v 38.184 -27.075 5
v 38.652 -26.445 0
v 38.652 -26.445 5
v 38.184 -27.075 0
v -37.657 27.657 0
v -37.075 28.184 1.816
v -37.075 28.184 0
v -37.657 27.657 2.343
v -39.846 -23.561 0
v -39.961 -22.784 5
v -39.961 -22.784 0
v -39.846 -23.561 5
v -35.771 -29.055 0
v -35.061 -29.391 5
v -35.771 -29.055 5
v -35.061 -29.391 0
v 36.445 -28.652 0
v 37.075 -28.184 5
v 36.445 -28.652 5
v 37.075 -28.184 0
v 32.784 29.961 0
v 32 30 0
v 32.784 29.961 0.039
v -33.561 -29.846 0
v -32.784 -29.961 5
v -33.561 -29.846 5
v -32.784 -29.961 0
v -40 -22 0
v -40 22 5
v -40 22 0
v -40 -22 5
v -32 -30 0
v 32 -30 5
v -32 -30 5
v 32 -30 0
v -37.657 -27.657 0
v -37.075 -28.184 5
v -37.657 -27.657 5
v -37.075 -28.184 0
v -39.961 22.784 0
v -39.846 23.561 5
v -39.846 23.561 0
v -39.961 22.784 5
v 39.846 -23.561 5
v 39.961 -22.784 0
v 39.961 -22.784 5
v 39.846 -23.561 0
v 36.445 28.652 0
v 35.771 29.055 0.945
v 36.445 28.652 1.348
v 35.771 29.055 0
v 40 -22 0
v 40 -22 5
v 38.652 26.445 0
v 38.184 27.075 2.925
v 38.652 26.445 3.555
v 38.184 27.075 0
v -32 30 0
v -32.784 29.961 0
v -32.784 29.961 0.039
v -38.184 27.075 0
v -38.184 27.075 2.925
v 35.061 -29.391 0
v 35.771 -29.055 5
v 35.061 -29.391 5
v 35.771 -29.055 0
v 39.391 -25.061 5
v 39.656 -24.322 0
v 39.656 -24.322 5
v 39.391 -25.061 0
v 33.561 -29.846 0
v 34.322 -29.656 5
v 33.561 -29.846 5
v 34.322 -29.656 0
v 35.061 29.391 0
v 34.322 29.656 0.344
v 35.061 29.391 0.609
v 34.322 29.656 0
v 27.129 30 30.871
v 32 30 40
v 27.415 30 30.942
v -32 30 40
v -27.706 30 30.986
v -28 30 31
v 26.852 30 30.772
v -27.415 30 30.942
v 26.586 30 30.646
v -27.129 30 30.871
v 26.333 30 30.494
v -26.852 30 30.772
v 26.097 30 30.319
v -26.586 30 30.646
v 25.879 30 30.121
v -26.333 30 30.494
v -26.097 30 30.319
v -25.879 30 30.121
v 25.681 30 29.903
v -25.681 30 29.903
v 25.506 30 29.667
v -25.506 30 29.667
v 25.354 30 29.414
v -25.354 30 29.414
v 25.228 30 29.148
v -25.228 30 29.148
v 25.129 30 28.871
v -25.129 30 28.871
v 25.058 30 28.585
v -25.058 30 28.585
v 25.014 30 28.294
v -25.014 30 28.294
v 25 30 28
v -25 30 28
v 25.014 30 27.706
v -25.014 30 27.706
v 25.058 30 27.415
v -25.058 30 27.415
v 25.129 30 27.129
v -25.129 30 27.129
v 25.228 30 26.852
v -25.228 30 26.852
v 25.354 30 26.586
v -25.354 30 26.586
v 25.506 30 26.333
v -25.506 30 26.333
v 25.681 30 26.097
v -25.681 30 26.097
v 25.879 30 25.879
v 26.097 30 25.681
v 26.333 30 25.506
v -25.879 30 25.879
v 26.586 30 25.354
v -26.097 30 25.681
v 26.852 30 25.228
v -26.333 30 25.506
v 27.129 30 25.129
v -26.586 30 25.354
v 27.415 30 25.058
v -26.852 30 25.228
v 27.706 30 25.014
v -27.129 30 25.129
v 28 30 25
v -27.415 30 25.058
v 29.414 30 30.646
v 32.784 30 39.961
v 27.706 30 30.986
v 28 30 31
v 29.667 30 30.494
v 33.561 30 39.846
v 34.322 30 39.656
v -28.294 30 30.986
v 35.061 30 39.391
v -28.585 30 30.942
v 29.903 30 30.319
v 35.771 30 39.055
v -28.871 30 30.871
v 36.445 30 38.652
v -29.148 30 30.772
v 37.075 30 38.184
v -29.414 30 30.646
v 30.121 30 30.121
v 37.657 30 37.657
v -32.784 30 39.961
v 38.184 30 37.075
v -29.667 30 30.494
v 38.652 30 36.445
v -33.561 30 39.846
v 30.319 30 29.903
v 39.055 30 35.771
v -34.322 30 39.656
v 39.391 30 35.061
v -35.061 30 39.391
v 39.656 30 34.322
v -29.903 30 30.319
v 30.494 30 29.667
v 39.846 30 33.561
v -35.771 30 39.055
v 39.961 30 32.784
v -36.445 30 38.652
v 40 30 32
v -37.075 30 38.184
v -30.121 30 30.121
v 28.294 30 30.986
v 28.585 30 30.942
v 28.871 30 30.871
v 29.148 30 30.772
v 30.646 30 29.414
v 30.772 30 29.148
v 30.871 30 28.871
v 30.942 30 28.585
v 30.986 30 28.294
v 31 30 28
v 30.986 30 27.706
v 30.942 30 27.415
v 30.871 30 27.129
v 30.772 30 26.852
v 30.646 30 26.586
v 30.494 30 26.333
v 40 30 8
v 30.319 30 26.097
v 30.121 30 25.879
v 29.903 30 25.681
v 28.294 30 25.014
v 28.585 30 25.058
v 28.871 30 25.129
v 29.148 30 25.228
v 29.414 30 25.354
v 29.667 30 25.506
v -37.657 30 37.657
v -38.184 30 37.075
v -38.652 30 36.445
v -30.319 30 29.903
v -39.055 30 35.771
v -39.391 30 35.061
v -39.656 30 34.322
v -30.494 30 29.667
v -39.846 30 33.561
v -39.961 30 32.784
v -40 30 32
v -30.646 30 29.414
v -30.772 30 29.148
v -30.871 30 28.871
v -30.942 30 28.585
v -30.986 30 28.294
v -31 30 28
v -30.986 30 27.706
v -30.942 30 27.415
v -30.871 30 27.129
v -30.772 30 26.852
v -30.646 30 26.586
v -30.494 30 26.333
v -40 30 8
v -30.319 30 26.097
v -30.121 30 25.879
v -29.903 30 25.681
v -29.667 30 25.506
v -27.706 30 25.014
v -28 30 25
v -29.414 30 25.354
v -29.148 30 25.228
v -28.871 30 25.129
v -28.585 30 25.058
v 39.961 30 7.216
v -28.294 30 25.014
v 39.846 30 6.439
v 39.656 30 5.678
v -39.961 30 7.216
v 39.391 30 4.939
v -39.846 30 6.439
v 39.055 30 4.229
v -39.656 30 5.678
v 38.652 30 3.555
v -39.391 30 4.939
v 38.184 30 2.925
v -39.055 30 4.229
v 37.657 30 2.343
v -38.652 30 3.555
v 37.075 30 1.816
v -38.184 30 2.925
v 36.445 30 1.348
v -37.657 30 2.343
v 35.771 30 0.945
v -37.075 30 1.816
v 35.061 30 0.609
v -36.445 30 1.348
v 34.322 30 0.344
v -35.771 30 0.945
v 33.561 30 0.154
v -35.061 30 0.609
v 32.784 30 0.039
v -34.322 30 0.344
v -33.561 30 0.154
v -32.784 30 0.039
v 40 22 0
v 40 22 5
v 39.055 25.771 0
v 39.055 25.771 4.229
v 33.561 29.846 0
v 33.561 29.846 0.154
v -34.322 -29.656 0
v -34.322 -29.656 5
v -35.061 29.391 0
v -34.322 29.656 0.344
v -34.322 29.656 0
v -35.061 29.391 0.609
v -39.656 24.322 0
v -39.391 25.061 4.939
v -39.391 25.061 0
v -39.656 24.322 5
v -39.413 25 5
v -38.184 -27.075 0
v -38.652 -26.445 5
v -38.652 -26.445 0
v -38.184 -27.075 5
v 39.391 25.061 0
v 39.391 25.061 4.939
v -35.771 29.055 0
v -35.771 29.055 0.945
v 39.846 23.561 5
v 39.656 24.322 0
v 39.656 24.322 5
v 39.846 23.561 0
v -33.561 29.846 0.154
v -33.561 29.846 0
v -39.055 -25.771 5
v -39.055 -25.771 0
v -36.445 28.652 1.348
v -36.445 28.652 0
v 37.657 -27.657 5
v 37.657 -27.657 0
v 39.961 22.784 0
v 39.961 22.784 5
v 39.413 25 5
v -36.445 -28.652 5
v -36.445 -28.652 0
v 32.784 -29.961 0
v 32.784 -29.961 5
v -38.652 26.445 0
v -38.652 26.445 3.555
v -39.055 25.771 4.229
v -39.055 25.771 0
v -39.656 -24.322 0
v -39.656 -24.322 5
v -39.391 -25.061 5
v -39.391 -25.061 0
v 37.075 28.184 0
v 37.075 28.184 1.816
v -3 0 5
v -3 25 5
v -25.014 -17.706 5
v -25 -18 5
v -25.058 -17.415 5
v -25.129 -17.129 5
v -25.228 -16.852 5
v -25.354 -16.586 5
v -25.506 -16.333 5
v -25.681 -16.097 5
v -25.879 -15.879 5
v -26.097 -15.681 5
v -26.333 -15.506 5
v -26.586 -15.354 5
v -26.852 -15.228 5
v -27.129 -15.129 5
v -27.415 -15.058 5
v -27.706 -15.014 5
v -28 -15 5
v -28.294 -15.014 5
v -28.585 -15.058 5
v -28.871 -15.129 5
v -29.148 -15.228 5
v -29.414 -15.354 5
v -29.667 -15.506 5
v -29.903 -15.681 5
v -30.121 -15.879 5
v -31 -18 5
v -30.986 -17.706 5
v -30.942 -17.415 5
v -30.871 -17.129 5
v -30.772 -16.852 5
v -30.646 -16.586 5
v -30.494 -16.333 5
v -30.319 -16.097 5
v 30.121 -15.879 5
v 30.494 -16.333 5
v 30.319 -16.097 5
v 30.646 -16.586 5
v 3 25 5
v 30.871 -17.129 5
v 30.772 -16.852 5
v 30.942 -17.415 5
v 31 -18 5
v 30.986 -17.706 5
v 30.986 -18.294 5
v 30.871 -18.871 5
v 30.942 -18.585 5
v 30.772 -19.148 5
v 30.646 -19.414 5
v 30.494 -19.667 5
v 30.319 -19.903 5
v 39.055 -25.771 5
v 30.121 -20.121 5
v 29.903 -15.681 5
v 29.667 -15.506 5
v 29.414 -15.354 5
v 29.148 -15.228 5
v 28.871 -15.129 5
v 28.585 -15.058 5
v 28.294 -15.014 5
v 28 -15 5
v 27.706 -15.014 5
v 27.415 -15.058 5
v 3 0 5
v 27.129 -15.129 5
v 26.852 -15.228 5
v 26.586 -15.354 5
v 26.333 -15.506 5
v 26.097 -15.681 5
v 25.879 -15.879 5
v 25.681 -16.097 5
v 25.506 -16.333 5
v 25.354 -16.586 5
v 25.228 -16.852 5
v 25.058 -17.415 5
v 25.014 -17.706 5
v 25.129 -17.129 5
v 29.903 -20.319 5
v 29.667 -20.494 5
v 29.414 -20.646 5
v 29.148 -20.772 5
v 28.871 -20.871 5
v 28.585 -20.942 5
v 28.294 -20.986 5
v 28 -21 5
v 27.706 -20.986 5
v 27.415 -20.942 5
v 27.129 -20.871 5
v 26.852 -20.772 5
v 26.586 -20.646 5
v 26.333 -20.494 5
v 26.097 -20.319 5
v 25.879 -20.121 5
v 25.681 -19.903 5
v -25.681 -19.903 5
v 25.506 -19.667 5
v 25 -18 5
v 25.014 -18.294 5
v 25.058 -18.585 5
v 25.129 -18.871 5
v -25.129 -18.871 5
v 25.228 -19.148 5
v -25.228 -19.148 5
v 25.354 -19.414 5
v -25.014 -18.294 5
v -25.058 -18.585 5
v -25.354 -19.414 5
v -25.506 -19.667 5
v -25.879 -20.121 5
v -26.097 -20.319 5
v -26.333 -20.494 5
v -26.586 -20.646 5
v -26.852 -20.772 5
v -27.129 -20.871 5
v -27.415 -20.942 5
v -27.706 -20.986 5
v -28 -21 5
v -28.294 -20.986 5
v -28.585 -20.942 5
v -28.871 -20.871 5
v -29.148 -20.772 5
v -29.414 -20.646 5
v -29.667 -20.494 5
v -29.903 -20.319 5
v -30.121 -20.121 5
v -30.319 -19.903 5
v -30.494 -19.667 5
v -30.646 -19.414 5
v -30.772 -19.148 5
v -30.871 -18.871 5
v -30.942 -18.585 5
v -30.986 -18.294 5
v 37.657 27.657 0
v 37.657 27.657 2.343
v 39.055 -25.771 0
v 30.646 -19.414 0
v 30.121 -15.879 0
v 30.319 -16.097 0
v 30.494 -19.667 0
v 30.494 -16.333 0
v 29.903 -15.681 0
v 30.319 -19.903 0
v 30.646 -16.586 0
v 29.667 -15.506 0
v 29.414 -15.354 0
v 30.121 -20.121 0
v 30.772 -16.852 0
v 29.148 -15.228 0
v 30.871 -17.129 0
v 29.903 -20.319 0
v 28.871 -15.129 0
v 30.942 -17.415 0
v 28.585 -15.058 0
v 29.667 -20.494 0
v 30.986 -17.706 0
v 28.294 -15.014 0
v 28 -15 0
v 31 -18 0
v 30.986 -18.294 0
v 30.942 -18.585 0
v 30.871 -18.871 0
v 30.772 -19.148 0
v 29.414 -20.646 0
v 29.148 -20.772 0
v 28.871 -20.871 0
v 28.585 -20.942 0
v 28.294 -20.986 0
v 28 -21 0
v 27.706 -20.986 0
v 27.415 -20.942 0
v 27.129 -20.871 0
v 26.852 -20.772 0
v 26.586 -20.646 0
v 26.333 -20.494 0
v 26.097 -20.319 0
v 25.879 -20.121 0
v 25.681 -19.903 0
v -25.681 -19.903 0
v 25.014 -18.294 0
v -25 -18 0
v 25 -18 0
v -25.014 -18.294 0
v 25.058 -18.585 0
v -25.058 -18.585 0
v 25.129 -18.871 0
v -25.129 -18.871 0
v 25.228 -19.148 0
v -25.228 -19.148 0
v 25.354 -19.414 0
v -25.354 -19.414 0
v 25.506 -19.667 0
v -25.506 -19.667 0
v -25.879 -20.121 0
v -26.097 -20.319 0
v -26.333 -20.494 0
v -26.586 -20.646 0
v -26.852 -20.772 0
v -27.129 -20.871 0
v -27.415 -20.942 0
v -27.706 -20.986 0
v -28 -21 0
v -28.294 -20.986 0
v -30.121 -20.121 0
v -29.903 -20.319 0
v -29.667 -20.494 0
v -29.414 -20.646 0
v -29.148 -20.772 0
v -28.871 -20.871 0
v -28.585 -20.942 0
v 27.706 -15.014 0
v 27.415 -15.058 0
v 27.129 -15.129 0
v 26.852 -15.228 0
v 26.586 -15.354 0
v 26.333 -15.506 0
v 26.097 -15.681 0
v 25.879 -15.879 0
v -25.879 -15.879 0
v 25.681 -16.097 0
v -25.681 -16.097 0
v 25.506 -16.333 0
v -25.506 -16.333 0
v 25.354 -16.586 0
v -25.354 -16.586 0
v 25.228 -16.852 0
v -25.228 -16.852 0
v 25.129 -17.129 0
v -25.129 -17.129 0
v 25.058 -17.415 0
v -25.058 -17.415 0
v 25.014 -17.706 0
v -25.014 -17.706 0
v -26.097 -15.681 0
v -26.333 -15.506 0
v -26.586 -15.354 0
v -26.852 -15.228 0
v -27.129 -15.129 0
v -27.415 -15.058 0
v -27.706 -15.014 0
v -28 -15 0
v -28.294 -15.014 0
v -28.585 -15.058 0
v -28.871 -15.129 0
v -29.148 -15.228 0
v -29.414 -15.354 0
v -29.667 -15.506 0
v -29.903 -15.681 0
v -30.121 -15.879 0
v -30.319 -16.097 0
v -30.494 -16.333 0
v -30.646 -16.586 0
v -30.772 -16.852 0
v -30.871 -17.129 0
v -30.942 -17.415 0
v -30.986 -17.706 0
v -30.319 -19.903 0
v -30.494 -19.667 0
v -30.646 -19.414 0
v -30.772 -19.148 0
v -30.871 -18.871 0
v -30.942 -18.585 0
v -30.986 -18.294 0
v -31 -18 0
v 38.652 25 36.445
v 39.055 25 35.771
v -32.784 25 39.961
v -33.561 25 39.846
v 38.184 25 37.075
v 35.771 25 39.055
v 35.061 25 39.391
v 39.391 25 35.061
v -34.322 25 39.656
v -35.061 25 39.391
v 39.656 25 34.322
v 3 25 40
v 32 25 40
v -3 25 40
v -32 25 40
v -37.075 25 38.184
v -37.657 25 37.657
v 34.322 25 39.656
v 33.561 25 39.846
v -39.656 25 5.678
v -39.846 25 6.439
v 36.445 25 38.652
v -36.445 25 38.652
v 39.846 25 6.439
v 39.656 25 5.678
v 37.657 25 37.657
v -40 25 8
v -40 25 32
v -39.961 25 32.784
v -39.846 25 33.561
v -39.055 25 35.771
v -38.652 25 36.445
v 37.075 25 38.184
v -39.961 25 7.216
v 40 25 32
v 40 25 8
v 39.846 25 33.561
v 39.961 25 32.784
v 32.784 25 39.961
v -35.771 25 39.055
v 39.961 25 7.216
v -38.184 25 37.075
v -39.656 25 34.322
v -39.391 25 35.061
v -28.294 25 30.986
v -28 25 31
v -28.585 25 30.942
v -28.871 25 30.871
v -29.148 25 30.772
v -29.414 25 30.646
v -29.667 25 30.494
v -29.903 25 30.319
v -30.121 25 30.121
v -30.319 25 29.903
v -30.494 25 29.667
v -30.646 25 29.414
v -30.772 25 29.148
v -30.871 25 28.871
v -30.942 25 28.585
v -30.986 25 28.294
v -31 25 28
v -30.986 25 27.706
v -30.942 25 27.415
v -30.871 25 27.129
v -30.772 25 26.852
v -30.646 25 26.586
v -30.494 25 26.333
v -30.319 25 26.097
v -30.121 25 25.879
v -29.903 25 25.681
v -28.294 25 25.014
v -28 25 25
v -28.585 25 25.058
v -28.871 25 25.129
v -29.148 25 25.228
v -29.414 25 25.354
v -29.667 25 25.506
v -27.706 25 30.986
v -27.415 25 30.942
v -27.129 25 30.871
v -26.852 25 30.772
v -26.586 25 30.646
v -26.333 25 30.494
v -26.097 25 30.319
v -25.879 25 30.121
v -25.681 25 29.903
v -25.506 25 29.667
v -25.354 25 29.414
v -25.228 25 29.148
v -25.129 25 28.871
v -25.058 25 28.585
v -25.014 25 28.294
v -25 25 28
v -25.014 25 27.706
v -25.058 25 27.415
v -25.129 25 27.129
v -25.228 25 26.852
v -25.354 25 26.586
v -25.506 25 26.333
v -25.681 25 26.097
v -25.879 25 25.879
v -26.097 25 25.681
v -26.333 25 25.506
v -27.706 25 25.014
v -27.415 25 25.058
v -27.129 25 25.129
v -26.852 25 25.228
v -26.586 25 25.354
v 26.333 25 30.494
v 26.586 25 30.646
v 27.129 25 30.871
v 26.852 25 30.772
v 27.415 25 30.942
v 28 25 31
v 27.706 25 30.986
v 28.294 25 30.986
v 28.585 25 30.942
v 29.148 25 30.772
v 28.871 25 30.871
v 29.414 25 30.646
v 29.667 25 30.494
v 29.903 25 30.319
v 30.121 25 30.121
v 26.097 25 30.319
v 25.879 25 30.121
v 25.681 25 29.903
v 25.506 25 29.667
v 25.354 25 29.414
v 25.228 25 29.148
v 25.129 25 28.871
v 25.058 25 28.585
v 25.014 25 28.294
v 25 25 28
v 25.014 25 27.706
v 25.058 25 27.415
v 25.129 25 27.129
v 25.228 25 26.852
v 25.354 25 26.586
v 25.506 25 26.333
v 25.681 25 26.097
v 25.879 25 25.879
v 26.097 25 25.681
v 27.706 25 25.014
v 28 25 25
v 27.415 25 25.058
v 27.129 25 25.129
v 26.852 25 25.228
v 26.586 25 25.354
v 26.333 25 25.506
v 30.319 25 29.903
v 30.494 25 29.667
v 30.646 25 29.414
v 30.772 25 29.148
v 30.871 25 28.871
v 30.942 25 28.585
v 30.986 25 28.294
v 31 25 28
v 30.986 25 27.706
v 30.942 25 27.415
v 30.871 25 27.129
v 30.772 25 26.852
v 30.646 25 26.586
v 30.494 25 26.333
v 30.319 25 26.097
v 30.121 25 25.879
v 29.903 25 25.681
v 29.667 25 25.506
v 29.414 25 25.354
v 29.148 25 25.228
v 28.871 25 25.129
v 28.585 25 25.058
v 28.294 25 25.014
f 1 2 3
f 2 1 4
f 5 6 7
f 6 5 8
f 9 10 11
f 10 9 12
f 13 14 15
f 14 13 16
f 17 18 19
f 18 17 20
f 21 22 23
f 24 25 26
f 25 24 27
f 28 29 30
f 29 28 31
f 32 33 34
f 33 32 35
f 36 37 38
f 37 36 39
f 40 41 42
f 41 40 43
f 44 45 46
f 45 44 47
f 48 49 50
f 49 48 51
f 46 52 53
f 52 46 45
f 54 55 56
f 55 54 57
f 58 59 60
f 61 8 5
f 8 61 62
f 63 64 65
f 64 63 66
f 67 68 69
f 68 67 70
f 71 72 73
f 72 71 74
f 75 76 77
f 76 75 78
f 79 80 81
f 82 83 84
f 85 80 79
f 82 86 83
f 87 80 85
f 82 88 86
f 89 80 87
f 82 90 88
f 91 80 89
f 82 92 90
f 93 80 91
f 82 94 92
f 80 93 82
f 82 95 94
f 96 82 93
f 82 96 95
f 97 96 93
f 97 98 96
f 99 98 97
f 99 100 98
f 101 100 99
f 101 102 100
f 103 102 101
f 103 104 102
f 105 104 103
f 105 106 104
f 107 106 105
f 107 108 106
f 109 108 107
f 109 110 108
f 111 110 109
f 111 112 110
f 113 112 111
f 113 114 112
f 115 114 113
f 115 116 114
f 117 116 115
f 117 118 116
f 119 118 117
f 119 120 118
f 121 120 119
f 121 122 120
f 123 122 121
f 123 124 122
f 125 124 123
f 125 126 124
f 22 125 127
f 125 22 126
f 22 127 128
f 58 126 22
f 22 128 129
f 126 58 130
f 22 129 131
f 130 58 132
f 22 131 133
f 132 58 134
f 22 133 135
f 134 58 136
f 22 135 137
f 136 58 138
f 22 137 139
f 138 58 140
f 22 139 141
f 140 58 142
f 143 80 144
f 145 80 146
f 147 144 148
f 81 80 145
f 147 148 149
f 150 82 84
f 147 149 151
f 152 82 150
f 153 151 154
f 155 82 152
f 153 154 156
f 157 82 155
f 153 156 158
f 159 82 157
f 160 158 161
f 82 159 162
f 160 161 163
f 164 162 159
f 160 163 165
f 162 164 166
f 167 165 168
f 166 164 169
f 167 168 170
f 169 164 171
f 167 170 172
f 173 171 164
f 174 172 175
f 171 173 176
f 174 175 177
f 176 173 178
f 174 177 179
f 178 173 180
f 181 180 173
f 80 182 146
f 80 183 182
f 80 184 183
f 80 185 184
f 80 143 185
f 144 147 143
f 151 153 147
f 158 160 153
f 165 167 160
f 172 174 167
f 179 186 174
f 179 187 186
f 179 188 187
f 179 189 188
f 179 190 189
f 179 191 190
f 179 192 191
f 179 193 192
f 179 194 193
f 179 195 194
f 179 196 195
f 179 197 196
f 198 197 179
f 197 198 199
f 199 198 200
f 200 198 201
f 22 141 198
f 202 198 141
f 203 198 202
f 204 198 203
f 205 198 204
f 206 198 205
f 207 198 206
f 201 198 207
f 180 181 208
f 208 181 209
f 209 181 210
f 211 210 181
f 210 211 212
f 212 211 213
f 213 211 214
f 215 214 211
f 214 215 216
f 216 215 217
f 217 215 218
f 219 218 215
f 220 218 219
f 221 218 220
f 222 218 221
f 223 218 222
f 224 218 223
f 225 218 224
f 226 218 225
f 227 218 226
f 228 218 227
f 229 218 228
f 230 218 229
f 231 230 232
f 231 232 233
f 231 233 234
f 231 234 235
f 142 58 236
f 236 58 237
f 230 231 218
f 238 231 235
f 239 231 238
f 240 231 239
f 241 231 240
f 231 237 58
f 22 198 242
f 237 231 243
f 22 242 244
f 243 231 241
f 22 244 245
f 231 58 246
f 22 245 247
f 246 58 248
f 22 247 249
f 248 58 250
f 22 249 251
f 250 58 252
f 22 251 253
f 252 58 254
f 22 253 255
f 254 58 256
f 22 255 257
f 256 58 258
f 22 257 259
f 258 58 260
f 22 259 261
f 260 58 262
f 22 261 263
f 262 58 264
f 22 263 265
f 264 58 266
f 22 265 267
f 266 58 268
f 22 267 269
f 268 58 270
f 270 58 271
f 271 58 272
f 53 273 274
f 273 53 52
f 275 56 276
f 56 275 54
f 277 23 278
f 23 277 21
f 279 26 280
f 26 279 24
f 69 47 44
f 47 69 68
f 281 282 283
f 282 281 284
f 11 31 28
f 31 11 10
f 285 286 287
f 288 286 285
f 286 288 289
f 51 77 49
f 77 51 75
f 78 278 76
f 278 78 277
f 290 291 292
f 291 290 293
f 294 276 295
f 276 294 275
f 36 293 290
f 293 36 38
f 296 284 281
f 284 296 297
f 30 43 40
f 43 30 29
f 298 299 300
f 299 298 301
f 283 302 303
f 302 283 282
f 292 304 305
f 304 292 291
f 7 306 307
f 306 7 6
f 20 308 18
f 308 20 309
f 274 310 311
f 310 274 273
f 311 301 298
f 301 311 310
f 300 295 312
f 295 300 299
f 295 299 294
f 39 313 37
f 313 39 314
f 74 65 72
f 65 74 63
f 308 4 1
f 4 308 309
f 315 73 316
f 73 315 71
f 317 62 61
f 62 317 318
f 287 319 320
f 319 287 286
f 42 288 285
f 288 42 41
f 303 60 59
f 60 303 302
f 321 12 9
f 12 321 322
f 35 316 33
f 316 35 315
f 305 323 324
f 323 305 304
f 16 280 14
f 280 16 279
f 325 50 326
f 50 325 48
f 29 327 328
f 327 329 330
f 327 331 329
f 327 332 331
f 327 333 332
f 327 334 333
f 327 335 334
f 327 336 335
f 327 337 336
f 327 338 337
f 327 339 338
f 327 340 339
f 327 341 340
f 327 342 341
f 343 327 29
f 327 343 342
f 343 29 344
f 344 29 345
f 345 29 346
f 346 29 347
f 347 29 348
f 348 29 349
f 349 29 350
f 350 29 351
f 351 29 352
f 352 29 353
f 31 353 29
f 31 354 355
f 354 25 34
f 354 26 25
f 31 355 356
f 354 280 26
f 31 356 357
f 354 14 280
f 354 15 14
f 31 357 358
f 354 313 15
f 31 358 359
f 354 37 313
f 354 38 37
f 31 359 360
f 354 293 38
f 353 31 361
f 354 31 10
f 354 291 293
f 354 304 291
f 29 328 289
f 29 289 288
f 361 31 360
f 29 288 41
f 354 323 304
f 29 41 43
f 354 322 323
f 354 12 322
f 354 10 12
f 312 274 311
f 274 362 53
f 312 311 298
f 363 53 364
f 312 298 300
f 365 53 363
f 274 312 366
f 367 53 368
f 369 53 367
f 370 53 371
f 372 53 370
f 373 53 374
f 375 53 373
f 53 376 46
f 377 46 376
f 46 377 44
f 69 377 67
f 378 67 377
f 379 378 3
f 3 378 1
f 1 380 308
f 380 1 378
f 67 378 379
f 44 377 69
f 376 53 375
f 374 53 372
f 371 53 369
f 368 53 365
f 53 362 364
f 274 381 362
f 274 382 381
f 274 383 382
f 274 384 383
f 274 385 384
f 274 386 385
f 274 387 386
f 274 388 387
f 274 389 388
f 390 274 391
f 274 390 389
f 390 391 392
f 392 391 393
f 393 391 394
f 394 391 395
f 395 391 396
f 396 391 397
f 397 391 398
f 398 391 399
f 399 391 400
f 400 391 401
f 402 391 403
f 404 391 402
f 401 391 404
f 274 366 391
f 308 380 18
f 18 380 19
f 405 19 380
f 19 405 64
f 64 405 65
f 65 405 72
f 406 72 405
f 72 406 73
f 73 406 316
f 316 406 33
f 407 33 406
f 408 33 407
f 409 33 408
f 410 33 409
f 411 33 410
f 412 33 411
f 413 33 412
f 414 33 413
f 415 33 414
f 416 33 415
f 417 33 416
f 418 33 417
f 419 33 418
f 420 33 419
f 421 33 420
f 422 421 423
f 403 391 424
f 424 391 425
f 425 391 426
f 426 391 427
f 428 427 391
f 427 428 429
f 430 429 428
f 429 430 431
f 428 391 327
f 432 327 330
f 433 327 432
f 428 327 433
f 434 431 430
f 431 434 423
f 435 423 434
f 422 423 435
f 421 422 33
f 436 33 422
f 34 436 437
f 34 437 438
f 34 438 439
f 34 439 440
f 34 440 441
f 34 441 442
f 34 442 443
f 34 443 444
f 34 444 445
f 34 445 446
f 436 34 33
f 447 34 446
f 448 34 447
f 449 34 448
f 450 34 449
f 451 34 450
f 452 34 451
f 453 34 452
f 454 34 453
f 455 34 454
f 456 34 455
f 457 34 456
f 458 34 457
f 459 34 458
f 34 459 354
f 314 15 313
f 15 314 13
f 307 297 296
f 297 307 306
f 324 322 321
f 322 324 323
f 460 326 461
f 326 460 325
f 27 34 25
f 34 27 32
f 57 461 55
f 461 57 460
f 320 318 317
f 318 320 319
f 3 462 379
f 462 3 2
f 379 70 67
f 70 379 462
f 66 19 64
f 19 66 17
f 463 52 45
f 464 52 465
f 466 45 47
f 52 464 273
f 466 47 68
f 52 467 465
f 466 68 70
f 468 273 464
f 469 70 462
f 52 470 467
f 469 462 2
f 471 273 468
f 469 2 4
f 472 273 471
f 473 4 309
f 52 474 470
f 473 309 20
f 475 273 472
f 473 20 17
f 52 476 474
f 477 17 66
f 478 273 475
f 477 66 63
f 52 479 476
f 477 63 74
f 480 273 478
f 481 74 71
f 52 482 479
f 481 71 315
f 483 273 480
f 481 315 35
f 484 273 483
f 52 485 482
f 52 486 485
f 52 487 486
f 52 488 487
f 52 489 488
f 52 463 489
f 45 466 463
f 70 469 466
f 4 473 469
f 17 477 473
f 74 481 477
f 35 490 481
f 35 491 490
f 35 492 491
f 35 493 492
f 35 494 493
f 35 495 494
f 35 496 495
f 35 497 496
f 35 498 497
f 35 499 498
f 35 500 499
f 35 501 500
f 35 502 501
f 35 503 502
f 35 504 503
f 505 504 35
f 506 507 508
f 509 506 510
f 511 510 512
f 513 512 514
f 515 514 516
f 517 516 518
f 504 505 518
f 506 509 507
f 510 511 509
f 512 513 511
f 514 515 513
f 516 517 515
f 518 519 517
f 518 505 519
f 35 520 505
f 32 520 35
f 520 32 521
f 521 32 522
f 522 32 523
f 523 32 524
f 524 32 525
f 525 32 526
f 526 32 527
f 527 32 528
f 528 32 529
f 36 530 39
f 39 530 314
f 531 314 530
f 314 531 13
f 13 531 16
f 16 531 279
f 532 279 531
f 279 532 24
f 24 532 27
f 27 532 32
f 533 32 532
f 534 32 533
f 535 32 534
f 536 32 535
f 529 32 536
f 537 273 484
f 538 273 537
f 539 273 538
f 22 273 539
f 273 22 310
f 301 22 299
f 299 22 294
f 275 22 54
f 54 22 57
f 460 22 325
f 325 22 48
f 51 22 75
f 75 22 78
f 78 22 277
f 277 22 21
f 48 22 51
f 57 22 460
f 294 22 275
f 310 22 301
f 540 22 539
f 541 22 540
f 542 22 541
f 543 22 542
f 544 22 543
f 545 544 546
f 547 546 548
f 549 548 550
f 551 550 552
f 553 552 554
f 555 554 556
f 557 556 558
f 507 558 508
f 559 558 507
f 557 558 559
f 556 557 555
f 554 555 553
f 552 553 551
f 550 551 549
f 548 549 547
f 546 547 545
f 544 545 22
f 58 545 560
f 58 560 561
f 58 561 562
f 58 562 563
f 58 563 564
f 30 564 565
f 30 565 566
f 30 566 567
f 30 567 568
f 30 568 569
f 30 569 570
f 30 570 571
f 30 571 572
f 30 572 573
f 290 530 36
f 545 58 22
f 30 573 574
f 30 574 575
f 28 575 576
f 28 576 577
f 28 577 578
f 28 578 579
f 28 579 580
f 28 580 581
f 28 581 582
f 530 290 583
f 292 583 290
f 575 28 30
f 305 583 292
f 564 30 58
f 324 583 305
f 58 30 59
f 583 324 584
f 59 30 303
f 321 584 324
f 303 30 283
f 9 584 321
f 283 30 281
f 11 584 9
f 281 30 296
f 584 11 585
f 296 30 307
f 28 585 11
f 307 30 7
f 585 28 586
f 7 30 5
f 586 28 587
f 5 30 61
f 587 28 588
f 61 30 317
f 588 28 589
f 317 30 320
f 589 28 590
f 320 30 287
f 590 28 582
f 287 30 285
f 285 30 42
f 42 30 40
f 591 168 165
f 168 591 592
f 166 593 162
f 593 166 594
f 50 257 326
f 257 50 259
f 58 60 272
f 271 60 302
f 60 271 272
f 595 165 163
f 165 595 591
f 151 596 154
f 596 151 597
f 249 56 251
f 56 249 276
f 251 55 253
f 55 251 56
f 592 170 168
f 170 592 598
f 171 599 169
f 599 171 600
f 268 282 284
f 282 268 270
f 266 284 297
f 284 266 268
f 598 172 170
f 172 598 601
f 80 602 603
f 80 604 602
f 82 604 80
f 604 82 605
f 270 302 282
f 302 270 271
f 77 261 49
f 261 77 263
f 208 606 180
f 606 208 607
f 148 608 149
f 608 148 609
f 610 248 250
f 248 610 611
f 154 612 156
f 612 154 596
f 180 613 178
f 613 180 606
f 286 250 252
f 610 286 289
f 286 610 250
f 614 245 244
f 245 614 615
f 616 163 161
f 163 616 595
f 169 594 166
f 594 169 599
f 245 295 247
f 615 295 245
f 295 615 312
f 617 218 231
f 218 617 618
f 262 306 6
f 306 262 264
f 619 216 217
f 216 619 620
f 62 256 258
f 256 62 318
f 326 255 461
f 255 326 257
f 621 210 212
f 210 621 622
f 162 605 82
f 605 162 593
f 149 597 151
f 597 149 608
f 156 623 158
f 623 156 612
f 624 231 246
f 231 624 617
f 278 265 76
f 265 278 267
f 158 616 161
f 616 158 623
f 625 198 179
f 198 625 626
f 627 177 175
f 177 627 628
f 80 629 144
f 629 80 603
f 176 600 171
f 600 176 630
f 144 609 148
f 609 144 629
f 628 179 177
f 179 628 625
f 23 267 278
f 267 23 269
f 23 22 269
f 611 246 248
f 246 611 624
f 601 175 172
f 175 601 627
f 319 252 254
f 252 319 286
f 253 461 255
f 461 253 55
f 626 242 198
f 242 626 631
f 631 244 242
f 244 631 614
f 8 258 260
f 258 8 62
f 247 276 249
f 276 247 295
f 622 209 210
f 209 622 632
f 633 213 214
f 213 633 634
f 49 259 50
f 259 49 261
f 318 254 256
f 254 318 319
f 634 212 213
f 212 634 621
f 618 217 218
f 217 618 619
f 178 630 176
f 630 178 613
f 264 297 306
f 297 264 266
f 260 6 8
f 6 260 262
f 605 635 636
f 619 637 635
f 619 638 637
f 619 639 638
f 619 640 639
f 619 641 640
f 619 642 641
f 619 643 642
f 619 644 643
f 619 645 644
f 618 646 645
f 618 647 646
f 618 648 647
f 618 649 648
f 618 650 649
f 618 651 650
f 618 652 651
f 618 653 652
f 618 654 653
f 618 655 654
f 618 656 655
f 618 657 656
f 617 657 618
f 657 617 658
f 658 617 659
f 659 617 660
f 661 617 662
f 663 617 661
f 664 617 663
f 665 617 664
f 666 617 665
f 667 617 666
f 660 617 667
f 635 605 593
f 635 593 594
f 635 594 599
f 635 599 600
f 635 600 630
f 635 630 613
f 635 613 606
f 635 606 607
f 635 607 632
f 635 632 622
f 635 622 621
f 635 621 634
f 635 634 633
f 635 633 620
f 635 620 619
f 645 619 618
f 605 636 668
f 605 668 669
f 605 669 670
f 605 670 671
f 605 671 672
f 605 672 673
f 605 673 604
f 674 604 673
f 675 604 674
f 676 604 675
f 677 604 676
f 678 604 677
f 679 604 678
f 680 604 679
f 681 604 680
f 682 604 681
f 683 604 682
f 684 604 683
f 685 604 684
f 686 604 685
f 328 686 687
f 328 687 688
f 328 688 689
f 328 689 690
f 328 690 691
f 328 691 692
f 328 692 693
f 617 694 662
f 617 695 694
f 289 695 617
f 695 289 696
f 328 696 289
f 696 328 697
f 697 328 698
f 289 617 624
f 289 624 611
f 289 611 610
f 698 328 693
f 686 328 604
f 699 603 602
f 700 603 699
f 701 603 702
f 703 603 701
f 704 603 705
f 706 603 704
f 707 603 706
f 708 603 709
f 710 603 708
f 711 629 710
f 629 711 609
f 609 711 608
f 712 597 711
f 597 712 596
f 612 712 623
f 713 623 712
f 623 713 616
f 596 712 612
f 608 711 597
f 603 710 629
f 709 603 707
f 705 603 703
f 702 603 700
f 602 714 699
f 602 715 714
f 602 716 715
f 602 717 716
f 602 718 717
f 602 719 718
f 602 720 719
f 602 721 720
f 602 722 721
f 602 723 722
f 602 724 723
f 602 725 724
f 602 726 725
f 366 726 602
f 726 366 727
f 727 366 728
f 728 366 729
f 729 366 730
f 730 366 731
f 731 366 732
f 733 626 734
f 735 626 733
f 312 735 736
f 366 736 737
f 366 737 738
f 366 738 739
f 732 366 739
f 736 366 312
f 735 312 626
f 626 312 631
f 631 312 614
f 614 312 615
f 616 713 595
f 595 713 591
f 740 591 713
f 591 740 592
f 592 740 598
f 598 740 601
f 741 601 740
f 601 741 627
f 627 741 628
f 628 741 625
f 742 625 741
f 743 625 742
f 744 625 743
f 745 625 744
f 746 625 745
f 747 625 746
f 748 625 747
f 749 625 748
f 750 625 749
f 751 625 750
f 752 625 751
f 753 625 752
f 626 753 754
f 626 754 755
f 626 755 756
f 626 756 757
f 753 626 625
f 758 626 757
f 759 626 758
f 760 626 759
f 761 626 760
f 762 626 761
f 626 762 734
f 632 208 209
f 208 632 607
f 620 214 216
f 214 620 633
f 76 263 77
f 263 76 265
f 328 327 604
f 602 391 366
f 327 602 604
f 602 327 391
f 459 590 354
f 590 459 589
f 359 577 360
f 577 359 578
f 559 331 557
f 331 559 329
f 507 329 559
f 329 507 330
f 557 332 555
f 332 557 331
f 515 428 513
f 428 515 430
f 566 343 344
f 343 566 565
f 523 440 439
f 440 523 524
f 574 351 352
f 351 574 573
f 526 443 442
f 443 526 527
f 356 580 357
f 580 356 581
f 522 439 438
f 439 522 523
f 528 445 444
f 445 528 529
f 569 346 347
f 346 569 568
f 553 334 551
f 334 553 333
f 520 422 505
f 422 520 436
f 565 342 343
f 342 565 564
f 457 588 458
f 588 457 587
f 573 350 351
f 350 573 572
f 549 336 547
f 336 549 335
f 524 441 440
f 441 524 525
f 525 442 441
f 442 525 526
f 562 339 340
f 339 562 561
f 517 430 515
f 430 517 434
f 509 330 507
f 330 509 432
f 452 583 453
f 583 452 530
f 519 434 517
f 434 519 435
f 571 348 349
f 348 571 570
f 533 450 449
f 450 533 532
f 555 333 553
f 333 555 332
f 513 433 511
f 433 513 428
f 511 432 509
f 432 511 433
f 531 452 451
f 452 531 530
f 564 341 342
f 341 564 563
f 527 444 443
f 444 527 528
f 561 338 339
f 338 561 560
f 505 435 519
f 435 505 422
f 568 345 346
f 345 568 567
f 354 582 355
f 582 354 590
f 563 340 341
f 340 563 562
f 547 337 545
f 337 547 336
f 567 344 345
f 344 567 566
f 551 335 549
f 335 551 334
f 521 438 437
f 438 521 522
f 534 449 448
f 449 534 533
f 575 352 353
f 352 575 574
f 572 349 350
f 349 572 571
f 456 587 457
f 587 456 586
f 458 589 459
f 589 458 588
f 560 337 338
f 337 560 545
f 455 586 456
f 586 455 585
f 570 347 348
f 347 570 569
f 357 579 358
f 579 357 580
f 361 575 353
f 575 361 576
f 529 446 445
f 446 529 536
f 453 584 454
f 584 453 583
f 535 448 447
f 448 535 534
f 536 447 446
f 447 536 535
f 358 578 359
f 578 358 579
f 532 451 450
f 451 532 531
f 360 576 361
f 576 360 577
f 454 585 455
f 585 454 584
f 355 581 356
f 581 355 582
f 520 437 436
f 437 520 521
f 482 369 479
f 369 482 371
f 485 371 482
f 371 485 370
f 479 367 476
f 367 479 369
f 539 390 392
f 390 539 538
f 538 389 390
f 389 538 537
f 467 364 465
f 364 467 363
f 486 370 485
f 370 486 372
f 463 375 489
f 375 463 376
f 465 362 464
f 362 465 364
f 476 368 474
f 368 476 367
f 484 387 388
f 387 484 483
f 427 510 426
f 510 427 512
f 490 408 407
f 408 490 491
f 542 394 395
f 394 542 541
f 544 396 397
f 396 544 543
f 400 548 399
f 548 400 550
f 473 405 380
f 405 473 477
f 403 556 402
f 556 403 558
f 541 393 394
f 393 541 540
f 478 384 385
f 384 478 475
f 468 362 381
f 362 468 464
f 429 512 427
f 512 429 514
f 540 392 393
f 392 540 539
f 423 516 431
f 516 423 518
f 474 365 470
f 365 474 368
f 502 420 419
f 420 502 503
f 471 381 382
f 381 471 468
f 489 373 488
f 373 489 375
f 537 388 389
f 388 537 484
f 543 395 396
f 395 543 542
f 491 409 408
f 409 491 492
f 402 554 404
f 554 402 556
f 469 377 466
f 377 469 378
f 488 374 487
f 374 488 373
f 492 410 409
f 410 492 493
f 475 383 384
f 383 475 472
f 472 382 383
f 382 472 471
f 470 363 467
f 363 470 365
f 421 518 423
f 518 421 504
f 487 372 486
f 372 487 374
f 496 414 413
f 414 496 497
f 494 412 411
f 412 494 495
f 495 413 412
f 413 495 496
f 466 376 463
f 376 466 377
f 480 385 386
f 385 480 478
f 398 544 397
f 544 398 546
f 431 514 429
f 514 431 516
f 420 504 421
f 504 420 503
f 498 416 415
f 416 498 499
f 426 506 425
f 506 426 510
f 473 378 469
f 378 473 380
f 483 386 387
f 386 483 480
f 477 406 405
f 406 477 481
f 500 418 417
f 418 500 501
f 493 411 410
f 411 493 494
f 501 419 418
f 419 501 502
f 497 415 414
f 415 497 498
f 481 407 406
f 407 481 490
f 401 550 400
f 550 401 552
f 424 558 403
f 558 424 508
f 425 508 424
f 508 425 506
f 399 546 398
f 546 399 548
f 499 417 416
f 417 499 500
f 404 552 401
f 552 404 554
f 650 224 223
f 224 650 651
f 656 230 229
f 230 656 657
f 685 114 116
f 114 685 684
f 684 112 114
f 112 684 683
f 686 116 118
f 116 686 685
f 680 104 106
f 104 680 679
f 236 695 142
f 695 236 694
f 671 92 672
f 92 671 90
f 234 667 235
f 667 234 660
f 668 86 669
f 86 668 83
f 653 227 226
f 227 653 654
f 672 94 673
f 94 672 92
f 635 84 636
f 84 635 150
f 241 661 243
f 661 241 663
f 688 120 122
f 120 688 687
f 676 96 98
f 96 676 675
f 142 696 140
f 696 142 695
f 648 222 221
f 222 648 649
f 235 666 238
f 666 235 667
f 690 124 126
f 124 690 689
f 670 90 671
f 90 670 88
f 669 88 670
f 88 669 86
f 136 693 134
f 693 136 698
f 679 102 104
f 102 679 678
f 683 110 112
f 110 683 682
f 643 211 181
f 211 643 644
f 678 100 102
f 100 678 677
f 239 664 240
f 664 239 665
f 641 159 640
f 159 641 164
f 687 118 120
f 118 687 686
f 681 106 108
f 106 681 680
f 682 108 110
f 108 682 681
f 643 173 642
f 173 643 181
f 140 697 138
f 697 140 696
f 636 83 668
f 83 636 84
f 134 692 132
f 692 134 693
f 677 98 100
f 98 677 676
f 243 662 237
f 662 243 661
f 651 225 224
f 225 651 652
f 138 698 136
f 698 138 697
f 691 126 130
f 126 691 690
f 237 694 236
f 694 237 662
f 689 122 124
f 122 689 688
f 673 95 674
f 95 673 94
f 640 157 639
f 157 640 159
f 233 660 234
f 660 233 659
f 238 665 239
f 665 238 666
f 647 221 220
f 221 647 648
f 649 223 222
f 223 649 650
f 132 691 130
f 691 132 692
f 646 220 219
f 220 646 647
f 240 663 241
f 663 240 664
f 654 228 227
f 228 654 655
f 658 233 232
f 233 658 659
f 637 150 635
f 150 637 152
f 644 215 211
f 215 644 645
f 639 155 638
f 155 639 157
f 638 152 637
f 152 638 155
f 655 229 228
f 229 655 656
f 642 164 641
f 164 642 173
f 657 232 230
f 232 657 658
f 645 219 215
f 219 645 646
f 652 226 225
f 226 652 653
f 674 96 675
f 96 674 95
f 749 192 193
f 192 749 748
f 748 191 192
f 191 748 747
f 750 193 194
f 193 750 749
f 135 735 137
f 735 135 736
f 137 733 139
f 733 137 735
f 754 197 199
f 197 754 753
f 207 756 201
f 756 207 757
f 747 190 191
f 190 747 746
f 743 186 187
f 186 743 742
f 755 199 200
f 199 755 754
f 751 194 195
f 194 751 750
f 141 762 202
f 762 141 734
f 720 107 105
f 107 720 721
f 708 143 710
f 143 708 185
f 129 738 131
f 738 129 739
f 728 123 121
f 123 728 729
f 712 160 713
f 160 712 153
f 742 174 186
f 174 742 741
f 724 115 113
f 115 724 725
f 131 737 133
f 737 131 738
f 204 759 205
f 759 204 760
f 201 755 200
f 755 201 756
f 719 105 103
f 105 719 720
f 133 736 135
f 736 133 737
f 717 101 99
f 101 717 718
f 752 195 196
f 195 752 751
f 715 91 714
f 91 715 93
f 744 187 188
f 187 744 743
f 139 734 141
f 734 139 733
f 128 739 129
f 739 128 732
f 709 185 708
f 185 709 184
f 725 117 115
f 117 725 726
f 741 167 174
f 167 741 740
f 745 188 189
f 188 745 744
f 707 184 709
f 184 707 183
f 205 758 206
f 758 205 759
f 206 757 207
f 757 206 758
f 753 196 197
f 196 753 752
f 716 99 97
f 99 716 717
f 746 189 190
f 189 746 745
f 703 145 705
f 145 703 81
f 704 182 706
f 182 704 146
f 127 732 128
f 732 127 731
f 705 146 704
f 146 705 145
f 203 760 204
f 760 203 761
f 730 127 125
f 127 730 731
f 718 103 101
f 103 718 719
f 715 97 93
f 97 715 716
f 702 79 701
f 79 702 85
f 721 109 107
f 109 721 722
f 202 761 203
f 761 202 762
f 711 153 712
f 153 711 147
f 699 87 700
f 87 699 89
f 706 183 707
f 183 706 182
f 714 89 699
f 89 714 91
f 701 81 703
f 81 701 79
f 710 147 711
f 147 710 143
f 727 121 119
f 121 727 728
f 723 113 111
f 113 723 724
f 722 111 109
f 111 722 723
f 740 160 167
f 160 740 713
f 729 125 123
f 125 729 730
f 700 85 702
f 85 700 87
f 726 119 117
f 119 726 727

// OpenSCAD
// L 型安装支架 —— 带圆角和四个安装孔的示例零件
//
// 参数合法区间用注释声明，model.py check 会读它并强制校验：
//   model.py check examples/bracket.scad --set width=200   # 越界会报错退出
//   model.py check examples/bracket.scad --set width=100   # 正常
//
// @param width 40 140
// @param depth 30 120
// @param height 20 100
// @param thick 3 25
// @param fillet 2 20
// @param hole_d 3 25
// @param hole_inset 8 40

width     = 80;   // X 向总宽
depth     = 60;   // Y 向总深（底板）
height    = 40;   // 立板高度
thick     = 5;    // 板材厚
fillet    = 8;    // 外圆角半径
hole_d    = 6;    // 安装孔直径
hole_inset= 12;   // 孔心到边的距离

$fn = 64;
eps = 0.01;

// ---------- 几何模块 ----------

// XY 平面的圆角板：厚度沿 Z，底面在 z=0
module plate_xy(w, d, t, r) {
    hull()
        for (sx = [-1, 1], sy = [-1, 1])
            translate([sx * (w / 2 - r), sy * (d / 2 - r), 0])
                cylinder(h = t, r = r);
}

// XZ 平面的圆角板：厚度沿 Y、中心落在 y=0，**高度以 z=0 为中心**
// 注意这个模块不自带 z 基准，调用方必须自己把它抬到想要的高度。
module plate_xz(w, h, t, r) {
    translate([0, -t / 2, 0])
        hull()
            for (sx = [-1, 1], sz = [-1, 1])
                translate([sx * (w / 2 - r), 0, sz * (h / 2 - r)])
                    rotate([-90, 0, 0])
                        cylinder(h = t, r = r);
}

// 角撑加强筋：YZ 平面的直角三角形，沿 X 拉伸 tx，x 居中。
// 三角形从 y=0 往 **-Y** 方向长到 -ty（不是 +Y），
// 调用方把它 translate 到立板内表面，让它朝前长；朝 +Y 长会从后缘捅出去。
module gusset(ty, tz, tx) {
    translate([-tx / 2, 0, 0])
        rotate([90, 0, 90])
            linear_extrude(height = tx)
                polygon([[0, 0], [-ty, 0], [0, tz]]);
}

module bracket() {
    difference() {
        union() {
            // 底板
            plate_xy(width, depth, thick, fillet);
            // 立板，贴着底板后缘。plate_xz 以 z=0 为中心，必须抬 height/2
            // 让它坐在底板上，否则一半沉到 z=0 以下、立板顶的孔会打空。
            translate([0, depth / 2 - thick / 2, height / 2])
                plate_xz(width, height, thick, fillet);
            // 中间加强筋：根部贴在立板内表面 y=depth/2-thick，朝前长
            translate([0, depth / 2 - thick, thick])
                gusset(depth / 2 - thick, height - thick, thick * 1.2);
        }

        // 底板两个安装孔（靠近自由边），从底面向下切，通孔
        for (sx = [-1, 1])
            translate([sx * (width / 2 - hole_inset), -depth / 2 + hole_inset, -eps])
                cylinder(h = thick + 2 * eps, d = hole_d);

        // 立板两个安装孔（靠近顶边）。
        // 起点必须是立板**内表面** y=depth/2-thick，不能用中面：
        // 从中面起切只切掉后半块板，变成从背面看有孔、正面看不见的盲孔。
        for (sx = [-1, 1])
            translate([sx * (width / 2 - hole_inset), depth / 2 - thick, height - hole_inset])
                rotate([-90, 0, 0])
                    cylinder(h = thick + 2 * eps, d = hole_d);
    }
}

// ---------- 自检：几何前提，违反就直接报错而不是渲出个废件 ----------

// 圆角：半径必须小于最短边的半宽，否则 hull 直接退化
assert(fillet < min(width, depth) / 2 - 1, str("圆角太大：fillet < min(width,depth)/2 - 1"));
// 孔位：离边要够远，既不能压到圆角起点，也不能撞到另一条边
assert(hole_inset > fillet + 1, str("孔位太靠边：hole_inset > fillet + 1"));
assert(hole_inset < depth / 2 - fillet, str("孔位撞到后缘"));
// 孔必须整圈落在圆角内侧的平直区：孔的外缘 < 圆角起点，否则会啃掉圆角
assert(width / 2 - hole_inset + hole_d / 2 < width / 2 - fillet, str("立板孔啃到侧边圆角"));
assert(depth / 2 - hole_inset + hole_d / 2 < depth / 2 - fillet, str("底板孔啃到前边圆角"));
assert(hole_d < hole_inset * 2, str("孔太大：hole_d < 2 * hole_inset"));
// 立板孔必须整圈落在板内
assert(height - hole_inset > hole_d / 2 + 1, str("立板孔溢出板顶"));
assert(height - hole_inset + hole_d / 2 < height, str("立板孔穿出板顶"));
// 板要够高够厚才放得下
assert(height > fillet + hole_inset + 2, str("立板太矮：height > fillet + hole_inset + 2"));
assert(thick * 1.2 < width / 2 - fillet, str("加强筋太厚"));

bracket();
